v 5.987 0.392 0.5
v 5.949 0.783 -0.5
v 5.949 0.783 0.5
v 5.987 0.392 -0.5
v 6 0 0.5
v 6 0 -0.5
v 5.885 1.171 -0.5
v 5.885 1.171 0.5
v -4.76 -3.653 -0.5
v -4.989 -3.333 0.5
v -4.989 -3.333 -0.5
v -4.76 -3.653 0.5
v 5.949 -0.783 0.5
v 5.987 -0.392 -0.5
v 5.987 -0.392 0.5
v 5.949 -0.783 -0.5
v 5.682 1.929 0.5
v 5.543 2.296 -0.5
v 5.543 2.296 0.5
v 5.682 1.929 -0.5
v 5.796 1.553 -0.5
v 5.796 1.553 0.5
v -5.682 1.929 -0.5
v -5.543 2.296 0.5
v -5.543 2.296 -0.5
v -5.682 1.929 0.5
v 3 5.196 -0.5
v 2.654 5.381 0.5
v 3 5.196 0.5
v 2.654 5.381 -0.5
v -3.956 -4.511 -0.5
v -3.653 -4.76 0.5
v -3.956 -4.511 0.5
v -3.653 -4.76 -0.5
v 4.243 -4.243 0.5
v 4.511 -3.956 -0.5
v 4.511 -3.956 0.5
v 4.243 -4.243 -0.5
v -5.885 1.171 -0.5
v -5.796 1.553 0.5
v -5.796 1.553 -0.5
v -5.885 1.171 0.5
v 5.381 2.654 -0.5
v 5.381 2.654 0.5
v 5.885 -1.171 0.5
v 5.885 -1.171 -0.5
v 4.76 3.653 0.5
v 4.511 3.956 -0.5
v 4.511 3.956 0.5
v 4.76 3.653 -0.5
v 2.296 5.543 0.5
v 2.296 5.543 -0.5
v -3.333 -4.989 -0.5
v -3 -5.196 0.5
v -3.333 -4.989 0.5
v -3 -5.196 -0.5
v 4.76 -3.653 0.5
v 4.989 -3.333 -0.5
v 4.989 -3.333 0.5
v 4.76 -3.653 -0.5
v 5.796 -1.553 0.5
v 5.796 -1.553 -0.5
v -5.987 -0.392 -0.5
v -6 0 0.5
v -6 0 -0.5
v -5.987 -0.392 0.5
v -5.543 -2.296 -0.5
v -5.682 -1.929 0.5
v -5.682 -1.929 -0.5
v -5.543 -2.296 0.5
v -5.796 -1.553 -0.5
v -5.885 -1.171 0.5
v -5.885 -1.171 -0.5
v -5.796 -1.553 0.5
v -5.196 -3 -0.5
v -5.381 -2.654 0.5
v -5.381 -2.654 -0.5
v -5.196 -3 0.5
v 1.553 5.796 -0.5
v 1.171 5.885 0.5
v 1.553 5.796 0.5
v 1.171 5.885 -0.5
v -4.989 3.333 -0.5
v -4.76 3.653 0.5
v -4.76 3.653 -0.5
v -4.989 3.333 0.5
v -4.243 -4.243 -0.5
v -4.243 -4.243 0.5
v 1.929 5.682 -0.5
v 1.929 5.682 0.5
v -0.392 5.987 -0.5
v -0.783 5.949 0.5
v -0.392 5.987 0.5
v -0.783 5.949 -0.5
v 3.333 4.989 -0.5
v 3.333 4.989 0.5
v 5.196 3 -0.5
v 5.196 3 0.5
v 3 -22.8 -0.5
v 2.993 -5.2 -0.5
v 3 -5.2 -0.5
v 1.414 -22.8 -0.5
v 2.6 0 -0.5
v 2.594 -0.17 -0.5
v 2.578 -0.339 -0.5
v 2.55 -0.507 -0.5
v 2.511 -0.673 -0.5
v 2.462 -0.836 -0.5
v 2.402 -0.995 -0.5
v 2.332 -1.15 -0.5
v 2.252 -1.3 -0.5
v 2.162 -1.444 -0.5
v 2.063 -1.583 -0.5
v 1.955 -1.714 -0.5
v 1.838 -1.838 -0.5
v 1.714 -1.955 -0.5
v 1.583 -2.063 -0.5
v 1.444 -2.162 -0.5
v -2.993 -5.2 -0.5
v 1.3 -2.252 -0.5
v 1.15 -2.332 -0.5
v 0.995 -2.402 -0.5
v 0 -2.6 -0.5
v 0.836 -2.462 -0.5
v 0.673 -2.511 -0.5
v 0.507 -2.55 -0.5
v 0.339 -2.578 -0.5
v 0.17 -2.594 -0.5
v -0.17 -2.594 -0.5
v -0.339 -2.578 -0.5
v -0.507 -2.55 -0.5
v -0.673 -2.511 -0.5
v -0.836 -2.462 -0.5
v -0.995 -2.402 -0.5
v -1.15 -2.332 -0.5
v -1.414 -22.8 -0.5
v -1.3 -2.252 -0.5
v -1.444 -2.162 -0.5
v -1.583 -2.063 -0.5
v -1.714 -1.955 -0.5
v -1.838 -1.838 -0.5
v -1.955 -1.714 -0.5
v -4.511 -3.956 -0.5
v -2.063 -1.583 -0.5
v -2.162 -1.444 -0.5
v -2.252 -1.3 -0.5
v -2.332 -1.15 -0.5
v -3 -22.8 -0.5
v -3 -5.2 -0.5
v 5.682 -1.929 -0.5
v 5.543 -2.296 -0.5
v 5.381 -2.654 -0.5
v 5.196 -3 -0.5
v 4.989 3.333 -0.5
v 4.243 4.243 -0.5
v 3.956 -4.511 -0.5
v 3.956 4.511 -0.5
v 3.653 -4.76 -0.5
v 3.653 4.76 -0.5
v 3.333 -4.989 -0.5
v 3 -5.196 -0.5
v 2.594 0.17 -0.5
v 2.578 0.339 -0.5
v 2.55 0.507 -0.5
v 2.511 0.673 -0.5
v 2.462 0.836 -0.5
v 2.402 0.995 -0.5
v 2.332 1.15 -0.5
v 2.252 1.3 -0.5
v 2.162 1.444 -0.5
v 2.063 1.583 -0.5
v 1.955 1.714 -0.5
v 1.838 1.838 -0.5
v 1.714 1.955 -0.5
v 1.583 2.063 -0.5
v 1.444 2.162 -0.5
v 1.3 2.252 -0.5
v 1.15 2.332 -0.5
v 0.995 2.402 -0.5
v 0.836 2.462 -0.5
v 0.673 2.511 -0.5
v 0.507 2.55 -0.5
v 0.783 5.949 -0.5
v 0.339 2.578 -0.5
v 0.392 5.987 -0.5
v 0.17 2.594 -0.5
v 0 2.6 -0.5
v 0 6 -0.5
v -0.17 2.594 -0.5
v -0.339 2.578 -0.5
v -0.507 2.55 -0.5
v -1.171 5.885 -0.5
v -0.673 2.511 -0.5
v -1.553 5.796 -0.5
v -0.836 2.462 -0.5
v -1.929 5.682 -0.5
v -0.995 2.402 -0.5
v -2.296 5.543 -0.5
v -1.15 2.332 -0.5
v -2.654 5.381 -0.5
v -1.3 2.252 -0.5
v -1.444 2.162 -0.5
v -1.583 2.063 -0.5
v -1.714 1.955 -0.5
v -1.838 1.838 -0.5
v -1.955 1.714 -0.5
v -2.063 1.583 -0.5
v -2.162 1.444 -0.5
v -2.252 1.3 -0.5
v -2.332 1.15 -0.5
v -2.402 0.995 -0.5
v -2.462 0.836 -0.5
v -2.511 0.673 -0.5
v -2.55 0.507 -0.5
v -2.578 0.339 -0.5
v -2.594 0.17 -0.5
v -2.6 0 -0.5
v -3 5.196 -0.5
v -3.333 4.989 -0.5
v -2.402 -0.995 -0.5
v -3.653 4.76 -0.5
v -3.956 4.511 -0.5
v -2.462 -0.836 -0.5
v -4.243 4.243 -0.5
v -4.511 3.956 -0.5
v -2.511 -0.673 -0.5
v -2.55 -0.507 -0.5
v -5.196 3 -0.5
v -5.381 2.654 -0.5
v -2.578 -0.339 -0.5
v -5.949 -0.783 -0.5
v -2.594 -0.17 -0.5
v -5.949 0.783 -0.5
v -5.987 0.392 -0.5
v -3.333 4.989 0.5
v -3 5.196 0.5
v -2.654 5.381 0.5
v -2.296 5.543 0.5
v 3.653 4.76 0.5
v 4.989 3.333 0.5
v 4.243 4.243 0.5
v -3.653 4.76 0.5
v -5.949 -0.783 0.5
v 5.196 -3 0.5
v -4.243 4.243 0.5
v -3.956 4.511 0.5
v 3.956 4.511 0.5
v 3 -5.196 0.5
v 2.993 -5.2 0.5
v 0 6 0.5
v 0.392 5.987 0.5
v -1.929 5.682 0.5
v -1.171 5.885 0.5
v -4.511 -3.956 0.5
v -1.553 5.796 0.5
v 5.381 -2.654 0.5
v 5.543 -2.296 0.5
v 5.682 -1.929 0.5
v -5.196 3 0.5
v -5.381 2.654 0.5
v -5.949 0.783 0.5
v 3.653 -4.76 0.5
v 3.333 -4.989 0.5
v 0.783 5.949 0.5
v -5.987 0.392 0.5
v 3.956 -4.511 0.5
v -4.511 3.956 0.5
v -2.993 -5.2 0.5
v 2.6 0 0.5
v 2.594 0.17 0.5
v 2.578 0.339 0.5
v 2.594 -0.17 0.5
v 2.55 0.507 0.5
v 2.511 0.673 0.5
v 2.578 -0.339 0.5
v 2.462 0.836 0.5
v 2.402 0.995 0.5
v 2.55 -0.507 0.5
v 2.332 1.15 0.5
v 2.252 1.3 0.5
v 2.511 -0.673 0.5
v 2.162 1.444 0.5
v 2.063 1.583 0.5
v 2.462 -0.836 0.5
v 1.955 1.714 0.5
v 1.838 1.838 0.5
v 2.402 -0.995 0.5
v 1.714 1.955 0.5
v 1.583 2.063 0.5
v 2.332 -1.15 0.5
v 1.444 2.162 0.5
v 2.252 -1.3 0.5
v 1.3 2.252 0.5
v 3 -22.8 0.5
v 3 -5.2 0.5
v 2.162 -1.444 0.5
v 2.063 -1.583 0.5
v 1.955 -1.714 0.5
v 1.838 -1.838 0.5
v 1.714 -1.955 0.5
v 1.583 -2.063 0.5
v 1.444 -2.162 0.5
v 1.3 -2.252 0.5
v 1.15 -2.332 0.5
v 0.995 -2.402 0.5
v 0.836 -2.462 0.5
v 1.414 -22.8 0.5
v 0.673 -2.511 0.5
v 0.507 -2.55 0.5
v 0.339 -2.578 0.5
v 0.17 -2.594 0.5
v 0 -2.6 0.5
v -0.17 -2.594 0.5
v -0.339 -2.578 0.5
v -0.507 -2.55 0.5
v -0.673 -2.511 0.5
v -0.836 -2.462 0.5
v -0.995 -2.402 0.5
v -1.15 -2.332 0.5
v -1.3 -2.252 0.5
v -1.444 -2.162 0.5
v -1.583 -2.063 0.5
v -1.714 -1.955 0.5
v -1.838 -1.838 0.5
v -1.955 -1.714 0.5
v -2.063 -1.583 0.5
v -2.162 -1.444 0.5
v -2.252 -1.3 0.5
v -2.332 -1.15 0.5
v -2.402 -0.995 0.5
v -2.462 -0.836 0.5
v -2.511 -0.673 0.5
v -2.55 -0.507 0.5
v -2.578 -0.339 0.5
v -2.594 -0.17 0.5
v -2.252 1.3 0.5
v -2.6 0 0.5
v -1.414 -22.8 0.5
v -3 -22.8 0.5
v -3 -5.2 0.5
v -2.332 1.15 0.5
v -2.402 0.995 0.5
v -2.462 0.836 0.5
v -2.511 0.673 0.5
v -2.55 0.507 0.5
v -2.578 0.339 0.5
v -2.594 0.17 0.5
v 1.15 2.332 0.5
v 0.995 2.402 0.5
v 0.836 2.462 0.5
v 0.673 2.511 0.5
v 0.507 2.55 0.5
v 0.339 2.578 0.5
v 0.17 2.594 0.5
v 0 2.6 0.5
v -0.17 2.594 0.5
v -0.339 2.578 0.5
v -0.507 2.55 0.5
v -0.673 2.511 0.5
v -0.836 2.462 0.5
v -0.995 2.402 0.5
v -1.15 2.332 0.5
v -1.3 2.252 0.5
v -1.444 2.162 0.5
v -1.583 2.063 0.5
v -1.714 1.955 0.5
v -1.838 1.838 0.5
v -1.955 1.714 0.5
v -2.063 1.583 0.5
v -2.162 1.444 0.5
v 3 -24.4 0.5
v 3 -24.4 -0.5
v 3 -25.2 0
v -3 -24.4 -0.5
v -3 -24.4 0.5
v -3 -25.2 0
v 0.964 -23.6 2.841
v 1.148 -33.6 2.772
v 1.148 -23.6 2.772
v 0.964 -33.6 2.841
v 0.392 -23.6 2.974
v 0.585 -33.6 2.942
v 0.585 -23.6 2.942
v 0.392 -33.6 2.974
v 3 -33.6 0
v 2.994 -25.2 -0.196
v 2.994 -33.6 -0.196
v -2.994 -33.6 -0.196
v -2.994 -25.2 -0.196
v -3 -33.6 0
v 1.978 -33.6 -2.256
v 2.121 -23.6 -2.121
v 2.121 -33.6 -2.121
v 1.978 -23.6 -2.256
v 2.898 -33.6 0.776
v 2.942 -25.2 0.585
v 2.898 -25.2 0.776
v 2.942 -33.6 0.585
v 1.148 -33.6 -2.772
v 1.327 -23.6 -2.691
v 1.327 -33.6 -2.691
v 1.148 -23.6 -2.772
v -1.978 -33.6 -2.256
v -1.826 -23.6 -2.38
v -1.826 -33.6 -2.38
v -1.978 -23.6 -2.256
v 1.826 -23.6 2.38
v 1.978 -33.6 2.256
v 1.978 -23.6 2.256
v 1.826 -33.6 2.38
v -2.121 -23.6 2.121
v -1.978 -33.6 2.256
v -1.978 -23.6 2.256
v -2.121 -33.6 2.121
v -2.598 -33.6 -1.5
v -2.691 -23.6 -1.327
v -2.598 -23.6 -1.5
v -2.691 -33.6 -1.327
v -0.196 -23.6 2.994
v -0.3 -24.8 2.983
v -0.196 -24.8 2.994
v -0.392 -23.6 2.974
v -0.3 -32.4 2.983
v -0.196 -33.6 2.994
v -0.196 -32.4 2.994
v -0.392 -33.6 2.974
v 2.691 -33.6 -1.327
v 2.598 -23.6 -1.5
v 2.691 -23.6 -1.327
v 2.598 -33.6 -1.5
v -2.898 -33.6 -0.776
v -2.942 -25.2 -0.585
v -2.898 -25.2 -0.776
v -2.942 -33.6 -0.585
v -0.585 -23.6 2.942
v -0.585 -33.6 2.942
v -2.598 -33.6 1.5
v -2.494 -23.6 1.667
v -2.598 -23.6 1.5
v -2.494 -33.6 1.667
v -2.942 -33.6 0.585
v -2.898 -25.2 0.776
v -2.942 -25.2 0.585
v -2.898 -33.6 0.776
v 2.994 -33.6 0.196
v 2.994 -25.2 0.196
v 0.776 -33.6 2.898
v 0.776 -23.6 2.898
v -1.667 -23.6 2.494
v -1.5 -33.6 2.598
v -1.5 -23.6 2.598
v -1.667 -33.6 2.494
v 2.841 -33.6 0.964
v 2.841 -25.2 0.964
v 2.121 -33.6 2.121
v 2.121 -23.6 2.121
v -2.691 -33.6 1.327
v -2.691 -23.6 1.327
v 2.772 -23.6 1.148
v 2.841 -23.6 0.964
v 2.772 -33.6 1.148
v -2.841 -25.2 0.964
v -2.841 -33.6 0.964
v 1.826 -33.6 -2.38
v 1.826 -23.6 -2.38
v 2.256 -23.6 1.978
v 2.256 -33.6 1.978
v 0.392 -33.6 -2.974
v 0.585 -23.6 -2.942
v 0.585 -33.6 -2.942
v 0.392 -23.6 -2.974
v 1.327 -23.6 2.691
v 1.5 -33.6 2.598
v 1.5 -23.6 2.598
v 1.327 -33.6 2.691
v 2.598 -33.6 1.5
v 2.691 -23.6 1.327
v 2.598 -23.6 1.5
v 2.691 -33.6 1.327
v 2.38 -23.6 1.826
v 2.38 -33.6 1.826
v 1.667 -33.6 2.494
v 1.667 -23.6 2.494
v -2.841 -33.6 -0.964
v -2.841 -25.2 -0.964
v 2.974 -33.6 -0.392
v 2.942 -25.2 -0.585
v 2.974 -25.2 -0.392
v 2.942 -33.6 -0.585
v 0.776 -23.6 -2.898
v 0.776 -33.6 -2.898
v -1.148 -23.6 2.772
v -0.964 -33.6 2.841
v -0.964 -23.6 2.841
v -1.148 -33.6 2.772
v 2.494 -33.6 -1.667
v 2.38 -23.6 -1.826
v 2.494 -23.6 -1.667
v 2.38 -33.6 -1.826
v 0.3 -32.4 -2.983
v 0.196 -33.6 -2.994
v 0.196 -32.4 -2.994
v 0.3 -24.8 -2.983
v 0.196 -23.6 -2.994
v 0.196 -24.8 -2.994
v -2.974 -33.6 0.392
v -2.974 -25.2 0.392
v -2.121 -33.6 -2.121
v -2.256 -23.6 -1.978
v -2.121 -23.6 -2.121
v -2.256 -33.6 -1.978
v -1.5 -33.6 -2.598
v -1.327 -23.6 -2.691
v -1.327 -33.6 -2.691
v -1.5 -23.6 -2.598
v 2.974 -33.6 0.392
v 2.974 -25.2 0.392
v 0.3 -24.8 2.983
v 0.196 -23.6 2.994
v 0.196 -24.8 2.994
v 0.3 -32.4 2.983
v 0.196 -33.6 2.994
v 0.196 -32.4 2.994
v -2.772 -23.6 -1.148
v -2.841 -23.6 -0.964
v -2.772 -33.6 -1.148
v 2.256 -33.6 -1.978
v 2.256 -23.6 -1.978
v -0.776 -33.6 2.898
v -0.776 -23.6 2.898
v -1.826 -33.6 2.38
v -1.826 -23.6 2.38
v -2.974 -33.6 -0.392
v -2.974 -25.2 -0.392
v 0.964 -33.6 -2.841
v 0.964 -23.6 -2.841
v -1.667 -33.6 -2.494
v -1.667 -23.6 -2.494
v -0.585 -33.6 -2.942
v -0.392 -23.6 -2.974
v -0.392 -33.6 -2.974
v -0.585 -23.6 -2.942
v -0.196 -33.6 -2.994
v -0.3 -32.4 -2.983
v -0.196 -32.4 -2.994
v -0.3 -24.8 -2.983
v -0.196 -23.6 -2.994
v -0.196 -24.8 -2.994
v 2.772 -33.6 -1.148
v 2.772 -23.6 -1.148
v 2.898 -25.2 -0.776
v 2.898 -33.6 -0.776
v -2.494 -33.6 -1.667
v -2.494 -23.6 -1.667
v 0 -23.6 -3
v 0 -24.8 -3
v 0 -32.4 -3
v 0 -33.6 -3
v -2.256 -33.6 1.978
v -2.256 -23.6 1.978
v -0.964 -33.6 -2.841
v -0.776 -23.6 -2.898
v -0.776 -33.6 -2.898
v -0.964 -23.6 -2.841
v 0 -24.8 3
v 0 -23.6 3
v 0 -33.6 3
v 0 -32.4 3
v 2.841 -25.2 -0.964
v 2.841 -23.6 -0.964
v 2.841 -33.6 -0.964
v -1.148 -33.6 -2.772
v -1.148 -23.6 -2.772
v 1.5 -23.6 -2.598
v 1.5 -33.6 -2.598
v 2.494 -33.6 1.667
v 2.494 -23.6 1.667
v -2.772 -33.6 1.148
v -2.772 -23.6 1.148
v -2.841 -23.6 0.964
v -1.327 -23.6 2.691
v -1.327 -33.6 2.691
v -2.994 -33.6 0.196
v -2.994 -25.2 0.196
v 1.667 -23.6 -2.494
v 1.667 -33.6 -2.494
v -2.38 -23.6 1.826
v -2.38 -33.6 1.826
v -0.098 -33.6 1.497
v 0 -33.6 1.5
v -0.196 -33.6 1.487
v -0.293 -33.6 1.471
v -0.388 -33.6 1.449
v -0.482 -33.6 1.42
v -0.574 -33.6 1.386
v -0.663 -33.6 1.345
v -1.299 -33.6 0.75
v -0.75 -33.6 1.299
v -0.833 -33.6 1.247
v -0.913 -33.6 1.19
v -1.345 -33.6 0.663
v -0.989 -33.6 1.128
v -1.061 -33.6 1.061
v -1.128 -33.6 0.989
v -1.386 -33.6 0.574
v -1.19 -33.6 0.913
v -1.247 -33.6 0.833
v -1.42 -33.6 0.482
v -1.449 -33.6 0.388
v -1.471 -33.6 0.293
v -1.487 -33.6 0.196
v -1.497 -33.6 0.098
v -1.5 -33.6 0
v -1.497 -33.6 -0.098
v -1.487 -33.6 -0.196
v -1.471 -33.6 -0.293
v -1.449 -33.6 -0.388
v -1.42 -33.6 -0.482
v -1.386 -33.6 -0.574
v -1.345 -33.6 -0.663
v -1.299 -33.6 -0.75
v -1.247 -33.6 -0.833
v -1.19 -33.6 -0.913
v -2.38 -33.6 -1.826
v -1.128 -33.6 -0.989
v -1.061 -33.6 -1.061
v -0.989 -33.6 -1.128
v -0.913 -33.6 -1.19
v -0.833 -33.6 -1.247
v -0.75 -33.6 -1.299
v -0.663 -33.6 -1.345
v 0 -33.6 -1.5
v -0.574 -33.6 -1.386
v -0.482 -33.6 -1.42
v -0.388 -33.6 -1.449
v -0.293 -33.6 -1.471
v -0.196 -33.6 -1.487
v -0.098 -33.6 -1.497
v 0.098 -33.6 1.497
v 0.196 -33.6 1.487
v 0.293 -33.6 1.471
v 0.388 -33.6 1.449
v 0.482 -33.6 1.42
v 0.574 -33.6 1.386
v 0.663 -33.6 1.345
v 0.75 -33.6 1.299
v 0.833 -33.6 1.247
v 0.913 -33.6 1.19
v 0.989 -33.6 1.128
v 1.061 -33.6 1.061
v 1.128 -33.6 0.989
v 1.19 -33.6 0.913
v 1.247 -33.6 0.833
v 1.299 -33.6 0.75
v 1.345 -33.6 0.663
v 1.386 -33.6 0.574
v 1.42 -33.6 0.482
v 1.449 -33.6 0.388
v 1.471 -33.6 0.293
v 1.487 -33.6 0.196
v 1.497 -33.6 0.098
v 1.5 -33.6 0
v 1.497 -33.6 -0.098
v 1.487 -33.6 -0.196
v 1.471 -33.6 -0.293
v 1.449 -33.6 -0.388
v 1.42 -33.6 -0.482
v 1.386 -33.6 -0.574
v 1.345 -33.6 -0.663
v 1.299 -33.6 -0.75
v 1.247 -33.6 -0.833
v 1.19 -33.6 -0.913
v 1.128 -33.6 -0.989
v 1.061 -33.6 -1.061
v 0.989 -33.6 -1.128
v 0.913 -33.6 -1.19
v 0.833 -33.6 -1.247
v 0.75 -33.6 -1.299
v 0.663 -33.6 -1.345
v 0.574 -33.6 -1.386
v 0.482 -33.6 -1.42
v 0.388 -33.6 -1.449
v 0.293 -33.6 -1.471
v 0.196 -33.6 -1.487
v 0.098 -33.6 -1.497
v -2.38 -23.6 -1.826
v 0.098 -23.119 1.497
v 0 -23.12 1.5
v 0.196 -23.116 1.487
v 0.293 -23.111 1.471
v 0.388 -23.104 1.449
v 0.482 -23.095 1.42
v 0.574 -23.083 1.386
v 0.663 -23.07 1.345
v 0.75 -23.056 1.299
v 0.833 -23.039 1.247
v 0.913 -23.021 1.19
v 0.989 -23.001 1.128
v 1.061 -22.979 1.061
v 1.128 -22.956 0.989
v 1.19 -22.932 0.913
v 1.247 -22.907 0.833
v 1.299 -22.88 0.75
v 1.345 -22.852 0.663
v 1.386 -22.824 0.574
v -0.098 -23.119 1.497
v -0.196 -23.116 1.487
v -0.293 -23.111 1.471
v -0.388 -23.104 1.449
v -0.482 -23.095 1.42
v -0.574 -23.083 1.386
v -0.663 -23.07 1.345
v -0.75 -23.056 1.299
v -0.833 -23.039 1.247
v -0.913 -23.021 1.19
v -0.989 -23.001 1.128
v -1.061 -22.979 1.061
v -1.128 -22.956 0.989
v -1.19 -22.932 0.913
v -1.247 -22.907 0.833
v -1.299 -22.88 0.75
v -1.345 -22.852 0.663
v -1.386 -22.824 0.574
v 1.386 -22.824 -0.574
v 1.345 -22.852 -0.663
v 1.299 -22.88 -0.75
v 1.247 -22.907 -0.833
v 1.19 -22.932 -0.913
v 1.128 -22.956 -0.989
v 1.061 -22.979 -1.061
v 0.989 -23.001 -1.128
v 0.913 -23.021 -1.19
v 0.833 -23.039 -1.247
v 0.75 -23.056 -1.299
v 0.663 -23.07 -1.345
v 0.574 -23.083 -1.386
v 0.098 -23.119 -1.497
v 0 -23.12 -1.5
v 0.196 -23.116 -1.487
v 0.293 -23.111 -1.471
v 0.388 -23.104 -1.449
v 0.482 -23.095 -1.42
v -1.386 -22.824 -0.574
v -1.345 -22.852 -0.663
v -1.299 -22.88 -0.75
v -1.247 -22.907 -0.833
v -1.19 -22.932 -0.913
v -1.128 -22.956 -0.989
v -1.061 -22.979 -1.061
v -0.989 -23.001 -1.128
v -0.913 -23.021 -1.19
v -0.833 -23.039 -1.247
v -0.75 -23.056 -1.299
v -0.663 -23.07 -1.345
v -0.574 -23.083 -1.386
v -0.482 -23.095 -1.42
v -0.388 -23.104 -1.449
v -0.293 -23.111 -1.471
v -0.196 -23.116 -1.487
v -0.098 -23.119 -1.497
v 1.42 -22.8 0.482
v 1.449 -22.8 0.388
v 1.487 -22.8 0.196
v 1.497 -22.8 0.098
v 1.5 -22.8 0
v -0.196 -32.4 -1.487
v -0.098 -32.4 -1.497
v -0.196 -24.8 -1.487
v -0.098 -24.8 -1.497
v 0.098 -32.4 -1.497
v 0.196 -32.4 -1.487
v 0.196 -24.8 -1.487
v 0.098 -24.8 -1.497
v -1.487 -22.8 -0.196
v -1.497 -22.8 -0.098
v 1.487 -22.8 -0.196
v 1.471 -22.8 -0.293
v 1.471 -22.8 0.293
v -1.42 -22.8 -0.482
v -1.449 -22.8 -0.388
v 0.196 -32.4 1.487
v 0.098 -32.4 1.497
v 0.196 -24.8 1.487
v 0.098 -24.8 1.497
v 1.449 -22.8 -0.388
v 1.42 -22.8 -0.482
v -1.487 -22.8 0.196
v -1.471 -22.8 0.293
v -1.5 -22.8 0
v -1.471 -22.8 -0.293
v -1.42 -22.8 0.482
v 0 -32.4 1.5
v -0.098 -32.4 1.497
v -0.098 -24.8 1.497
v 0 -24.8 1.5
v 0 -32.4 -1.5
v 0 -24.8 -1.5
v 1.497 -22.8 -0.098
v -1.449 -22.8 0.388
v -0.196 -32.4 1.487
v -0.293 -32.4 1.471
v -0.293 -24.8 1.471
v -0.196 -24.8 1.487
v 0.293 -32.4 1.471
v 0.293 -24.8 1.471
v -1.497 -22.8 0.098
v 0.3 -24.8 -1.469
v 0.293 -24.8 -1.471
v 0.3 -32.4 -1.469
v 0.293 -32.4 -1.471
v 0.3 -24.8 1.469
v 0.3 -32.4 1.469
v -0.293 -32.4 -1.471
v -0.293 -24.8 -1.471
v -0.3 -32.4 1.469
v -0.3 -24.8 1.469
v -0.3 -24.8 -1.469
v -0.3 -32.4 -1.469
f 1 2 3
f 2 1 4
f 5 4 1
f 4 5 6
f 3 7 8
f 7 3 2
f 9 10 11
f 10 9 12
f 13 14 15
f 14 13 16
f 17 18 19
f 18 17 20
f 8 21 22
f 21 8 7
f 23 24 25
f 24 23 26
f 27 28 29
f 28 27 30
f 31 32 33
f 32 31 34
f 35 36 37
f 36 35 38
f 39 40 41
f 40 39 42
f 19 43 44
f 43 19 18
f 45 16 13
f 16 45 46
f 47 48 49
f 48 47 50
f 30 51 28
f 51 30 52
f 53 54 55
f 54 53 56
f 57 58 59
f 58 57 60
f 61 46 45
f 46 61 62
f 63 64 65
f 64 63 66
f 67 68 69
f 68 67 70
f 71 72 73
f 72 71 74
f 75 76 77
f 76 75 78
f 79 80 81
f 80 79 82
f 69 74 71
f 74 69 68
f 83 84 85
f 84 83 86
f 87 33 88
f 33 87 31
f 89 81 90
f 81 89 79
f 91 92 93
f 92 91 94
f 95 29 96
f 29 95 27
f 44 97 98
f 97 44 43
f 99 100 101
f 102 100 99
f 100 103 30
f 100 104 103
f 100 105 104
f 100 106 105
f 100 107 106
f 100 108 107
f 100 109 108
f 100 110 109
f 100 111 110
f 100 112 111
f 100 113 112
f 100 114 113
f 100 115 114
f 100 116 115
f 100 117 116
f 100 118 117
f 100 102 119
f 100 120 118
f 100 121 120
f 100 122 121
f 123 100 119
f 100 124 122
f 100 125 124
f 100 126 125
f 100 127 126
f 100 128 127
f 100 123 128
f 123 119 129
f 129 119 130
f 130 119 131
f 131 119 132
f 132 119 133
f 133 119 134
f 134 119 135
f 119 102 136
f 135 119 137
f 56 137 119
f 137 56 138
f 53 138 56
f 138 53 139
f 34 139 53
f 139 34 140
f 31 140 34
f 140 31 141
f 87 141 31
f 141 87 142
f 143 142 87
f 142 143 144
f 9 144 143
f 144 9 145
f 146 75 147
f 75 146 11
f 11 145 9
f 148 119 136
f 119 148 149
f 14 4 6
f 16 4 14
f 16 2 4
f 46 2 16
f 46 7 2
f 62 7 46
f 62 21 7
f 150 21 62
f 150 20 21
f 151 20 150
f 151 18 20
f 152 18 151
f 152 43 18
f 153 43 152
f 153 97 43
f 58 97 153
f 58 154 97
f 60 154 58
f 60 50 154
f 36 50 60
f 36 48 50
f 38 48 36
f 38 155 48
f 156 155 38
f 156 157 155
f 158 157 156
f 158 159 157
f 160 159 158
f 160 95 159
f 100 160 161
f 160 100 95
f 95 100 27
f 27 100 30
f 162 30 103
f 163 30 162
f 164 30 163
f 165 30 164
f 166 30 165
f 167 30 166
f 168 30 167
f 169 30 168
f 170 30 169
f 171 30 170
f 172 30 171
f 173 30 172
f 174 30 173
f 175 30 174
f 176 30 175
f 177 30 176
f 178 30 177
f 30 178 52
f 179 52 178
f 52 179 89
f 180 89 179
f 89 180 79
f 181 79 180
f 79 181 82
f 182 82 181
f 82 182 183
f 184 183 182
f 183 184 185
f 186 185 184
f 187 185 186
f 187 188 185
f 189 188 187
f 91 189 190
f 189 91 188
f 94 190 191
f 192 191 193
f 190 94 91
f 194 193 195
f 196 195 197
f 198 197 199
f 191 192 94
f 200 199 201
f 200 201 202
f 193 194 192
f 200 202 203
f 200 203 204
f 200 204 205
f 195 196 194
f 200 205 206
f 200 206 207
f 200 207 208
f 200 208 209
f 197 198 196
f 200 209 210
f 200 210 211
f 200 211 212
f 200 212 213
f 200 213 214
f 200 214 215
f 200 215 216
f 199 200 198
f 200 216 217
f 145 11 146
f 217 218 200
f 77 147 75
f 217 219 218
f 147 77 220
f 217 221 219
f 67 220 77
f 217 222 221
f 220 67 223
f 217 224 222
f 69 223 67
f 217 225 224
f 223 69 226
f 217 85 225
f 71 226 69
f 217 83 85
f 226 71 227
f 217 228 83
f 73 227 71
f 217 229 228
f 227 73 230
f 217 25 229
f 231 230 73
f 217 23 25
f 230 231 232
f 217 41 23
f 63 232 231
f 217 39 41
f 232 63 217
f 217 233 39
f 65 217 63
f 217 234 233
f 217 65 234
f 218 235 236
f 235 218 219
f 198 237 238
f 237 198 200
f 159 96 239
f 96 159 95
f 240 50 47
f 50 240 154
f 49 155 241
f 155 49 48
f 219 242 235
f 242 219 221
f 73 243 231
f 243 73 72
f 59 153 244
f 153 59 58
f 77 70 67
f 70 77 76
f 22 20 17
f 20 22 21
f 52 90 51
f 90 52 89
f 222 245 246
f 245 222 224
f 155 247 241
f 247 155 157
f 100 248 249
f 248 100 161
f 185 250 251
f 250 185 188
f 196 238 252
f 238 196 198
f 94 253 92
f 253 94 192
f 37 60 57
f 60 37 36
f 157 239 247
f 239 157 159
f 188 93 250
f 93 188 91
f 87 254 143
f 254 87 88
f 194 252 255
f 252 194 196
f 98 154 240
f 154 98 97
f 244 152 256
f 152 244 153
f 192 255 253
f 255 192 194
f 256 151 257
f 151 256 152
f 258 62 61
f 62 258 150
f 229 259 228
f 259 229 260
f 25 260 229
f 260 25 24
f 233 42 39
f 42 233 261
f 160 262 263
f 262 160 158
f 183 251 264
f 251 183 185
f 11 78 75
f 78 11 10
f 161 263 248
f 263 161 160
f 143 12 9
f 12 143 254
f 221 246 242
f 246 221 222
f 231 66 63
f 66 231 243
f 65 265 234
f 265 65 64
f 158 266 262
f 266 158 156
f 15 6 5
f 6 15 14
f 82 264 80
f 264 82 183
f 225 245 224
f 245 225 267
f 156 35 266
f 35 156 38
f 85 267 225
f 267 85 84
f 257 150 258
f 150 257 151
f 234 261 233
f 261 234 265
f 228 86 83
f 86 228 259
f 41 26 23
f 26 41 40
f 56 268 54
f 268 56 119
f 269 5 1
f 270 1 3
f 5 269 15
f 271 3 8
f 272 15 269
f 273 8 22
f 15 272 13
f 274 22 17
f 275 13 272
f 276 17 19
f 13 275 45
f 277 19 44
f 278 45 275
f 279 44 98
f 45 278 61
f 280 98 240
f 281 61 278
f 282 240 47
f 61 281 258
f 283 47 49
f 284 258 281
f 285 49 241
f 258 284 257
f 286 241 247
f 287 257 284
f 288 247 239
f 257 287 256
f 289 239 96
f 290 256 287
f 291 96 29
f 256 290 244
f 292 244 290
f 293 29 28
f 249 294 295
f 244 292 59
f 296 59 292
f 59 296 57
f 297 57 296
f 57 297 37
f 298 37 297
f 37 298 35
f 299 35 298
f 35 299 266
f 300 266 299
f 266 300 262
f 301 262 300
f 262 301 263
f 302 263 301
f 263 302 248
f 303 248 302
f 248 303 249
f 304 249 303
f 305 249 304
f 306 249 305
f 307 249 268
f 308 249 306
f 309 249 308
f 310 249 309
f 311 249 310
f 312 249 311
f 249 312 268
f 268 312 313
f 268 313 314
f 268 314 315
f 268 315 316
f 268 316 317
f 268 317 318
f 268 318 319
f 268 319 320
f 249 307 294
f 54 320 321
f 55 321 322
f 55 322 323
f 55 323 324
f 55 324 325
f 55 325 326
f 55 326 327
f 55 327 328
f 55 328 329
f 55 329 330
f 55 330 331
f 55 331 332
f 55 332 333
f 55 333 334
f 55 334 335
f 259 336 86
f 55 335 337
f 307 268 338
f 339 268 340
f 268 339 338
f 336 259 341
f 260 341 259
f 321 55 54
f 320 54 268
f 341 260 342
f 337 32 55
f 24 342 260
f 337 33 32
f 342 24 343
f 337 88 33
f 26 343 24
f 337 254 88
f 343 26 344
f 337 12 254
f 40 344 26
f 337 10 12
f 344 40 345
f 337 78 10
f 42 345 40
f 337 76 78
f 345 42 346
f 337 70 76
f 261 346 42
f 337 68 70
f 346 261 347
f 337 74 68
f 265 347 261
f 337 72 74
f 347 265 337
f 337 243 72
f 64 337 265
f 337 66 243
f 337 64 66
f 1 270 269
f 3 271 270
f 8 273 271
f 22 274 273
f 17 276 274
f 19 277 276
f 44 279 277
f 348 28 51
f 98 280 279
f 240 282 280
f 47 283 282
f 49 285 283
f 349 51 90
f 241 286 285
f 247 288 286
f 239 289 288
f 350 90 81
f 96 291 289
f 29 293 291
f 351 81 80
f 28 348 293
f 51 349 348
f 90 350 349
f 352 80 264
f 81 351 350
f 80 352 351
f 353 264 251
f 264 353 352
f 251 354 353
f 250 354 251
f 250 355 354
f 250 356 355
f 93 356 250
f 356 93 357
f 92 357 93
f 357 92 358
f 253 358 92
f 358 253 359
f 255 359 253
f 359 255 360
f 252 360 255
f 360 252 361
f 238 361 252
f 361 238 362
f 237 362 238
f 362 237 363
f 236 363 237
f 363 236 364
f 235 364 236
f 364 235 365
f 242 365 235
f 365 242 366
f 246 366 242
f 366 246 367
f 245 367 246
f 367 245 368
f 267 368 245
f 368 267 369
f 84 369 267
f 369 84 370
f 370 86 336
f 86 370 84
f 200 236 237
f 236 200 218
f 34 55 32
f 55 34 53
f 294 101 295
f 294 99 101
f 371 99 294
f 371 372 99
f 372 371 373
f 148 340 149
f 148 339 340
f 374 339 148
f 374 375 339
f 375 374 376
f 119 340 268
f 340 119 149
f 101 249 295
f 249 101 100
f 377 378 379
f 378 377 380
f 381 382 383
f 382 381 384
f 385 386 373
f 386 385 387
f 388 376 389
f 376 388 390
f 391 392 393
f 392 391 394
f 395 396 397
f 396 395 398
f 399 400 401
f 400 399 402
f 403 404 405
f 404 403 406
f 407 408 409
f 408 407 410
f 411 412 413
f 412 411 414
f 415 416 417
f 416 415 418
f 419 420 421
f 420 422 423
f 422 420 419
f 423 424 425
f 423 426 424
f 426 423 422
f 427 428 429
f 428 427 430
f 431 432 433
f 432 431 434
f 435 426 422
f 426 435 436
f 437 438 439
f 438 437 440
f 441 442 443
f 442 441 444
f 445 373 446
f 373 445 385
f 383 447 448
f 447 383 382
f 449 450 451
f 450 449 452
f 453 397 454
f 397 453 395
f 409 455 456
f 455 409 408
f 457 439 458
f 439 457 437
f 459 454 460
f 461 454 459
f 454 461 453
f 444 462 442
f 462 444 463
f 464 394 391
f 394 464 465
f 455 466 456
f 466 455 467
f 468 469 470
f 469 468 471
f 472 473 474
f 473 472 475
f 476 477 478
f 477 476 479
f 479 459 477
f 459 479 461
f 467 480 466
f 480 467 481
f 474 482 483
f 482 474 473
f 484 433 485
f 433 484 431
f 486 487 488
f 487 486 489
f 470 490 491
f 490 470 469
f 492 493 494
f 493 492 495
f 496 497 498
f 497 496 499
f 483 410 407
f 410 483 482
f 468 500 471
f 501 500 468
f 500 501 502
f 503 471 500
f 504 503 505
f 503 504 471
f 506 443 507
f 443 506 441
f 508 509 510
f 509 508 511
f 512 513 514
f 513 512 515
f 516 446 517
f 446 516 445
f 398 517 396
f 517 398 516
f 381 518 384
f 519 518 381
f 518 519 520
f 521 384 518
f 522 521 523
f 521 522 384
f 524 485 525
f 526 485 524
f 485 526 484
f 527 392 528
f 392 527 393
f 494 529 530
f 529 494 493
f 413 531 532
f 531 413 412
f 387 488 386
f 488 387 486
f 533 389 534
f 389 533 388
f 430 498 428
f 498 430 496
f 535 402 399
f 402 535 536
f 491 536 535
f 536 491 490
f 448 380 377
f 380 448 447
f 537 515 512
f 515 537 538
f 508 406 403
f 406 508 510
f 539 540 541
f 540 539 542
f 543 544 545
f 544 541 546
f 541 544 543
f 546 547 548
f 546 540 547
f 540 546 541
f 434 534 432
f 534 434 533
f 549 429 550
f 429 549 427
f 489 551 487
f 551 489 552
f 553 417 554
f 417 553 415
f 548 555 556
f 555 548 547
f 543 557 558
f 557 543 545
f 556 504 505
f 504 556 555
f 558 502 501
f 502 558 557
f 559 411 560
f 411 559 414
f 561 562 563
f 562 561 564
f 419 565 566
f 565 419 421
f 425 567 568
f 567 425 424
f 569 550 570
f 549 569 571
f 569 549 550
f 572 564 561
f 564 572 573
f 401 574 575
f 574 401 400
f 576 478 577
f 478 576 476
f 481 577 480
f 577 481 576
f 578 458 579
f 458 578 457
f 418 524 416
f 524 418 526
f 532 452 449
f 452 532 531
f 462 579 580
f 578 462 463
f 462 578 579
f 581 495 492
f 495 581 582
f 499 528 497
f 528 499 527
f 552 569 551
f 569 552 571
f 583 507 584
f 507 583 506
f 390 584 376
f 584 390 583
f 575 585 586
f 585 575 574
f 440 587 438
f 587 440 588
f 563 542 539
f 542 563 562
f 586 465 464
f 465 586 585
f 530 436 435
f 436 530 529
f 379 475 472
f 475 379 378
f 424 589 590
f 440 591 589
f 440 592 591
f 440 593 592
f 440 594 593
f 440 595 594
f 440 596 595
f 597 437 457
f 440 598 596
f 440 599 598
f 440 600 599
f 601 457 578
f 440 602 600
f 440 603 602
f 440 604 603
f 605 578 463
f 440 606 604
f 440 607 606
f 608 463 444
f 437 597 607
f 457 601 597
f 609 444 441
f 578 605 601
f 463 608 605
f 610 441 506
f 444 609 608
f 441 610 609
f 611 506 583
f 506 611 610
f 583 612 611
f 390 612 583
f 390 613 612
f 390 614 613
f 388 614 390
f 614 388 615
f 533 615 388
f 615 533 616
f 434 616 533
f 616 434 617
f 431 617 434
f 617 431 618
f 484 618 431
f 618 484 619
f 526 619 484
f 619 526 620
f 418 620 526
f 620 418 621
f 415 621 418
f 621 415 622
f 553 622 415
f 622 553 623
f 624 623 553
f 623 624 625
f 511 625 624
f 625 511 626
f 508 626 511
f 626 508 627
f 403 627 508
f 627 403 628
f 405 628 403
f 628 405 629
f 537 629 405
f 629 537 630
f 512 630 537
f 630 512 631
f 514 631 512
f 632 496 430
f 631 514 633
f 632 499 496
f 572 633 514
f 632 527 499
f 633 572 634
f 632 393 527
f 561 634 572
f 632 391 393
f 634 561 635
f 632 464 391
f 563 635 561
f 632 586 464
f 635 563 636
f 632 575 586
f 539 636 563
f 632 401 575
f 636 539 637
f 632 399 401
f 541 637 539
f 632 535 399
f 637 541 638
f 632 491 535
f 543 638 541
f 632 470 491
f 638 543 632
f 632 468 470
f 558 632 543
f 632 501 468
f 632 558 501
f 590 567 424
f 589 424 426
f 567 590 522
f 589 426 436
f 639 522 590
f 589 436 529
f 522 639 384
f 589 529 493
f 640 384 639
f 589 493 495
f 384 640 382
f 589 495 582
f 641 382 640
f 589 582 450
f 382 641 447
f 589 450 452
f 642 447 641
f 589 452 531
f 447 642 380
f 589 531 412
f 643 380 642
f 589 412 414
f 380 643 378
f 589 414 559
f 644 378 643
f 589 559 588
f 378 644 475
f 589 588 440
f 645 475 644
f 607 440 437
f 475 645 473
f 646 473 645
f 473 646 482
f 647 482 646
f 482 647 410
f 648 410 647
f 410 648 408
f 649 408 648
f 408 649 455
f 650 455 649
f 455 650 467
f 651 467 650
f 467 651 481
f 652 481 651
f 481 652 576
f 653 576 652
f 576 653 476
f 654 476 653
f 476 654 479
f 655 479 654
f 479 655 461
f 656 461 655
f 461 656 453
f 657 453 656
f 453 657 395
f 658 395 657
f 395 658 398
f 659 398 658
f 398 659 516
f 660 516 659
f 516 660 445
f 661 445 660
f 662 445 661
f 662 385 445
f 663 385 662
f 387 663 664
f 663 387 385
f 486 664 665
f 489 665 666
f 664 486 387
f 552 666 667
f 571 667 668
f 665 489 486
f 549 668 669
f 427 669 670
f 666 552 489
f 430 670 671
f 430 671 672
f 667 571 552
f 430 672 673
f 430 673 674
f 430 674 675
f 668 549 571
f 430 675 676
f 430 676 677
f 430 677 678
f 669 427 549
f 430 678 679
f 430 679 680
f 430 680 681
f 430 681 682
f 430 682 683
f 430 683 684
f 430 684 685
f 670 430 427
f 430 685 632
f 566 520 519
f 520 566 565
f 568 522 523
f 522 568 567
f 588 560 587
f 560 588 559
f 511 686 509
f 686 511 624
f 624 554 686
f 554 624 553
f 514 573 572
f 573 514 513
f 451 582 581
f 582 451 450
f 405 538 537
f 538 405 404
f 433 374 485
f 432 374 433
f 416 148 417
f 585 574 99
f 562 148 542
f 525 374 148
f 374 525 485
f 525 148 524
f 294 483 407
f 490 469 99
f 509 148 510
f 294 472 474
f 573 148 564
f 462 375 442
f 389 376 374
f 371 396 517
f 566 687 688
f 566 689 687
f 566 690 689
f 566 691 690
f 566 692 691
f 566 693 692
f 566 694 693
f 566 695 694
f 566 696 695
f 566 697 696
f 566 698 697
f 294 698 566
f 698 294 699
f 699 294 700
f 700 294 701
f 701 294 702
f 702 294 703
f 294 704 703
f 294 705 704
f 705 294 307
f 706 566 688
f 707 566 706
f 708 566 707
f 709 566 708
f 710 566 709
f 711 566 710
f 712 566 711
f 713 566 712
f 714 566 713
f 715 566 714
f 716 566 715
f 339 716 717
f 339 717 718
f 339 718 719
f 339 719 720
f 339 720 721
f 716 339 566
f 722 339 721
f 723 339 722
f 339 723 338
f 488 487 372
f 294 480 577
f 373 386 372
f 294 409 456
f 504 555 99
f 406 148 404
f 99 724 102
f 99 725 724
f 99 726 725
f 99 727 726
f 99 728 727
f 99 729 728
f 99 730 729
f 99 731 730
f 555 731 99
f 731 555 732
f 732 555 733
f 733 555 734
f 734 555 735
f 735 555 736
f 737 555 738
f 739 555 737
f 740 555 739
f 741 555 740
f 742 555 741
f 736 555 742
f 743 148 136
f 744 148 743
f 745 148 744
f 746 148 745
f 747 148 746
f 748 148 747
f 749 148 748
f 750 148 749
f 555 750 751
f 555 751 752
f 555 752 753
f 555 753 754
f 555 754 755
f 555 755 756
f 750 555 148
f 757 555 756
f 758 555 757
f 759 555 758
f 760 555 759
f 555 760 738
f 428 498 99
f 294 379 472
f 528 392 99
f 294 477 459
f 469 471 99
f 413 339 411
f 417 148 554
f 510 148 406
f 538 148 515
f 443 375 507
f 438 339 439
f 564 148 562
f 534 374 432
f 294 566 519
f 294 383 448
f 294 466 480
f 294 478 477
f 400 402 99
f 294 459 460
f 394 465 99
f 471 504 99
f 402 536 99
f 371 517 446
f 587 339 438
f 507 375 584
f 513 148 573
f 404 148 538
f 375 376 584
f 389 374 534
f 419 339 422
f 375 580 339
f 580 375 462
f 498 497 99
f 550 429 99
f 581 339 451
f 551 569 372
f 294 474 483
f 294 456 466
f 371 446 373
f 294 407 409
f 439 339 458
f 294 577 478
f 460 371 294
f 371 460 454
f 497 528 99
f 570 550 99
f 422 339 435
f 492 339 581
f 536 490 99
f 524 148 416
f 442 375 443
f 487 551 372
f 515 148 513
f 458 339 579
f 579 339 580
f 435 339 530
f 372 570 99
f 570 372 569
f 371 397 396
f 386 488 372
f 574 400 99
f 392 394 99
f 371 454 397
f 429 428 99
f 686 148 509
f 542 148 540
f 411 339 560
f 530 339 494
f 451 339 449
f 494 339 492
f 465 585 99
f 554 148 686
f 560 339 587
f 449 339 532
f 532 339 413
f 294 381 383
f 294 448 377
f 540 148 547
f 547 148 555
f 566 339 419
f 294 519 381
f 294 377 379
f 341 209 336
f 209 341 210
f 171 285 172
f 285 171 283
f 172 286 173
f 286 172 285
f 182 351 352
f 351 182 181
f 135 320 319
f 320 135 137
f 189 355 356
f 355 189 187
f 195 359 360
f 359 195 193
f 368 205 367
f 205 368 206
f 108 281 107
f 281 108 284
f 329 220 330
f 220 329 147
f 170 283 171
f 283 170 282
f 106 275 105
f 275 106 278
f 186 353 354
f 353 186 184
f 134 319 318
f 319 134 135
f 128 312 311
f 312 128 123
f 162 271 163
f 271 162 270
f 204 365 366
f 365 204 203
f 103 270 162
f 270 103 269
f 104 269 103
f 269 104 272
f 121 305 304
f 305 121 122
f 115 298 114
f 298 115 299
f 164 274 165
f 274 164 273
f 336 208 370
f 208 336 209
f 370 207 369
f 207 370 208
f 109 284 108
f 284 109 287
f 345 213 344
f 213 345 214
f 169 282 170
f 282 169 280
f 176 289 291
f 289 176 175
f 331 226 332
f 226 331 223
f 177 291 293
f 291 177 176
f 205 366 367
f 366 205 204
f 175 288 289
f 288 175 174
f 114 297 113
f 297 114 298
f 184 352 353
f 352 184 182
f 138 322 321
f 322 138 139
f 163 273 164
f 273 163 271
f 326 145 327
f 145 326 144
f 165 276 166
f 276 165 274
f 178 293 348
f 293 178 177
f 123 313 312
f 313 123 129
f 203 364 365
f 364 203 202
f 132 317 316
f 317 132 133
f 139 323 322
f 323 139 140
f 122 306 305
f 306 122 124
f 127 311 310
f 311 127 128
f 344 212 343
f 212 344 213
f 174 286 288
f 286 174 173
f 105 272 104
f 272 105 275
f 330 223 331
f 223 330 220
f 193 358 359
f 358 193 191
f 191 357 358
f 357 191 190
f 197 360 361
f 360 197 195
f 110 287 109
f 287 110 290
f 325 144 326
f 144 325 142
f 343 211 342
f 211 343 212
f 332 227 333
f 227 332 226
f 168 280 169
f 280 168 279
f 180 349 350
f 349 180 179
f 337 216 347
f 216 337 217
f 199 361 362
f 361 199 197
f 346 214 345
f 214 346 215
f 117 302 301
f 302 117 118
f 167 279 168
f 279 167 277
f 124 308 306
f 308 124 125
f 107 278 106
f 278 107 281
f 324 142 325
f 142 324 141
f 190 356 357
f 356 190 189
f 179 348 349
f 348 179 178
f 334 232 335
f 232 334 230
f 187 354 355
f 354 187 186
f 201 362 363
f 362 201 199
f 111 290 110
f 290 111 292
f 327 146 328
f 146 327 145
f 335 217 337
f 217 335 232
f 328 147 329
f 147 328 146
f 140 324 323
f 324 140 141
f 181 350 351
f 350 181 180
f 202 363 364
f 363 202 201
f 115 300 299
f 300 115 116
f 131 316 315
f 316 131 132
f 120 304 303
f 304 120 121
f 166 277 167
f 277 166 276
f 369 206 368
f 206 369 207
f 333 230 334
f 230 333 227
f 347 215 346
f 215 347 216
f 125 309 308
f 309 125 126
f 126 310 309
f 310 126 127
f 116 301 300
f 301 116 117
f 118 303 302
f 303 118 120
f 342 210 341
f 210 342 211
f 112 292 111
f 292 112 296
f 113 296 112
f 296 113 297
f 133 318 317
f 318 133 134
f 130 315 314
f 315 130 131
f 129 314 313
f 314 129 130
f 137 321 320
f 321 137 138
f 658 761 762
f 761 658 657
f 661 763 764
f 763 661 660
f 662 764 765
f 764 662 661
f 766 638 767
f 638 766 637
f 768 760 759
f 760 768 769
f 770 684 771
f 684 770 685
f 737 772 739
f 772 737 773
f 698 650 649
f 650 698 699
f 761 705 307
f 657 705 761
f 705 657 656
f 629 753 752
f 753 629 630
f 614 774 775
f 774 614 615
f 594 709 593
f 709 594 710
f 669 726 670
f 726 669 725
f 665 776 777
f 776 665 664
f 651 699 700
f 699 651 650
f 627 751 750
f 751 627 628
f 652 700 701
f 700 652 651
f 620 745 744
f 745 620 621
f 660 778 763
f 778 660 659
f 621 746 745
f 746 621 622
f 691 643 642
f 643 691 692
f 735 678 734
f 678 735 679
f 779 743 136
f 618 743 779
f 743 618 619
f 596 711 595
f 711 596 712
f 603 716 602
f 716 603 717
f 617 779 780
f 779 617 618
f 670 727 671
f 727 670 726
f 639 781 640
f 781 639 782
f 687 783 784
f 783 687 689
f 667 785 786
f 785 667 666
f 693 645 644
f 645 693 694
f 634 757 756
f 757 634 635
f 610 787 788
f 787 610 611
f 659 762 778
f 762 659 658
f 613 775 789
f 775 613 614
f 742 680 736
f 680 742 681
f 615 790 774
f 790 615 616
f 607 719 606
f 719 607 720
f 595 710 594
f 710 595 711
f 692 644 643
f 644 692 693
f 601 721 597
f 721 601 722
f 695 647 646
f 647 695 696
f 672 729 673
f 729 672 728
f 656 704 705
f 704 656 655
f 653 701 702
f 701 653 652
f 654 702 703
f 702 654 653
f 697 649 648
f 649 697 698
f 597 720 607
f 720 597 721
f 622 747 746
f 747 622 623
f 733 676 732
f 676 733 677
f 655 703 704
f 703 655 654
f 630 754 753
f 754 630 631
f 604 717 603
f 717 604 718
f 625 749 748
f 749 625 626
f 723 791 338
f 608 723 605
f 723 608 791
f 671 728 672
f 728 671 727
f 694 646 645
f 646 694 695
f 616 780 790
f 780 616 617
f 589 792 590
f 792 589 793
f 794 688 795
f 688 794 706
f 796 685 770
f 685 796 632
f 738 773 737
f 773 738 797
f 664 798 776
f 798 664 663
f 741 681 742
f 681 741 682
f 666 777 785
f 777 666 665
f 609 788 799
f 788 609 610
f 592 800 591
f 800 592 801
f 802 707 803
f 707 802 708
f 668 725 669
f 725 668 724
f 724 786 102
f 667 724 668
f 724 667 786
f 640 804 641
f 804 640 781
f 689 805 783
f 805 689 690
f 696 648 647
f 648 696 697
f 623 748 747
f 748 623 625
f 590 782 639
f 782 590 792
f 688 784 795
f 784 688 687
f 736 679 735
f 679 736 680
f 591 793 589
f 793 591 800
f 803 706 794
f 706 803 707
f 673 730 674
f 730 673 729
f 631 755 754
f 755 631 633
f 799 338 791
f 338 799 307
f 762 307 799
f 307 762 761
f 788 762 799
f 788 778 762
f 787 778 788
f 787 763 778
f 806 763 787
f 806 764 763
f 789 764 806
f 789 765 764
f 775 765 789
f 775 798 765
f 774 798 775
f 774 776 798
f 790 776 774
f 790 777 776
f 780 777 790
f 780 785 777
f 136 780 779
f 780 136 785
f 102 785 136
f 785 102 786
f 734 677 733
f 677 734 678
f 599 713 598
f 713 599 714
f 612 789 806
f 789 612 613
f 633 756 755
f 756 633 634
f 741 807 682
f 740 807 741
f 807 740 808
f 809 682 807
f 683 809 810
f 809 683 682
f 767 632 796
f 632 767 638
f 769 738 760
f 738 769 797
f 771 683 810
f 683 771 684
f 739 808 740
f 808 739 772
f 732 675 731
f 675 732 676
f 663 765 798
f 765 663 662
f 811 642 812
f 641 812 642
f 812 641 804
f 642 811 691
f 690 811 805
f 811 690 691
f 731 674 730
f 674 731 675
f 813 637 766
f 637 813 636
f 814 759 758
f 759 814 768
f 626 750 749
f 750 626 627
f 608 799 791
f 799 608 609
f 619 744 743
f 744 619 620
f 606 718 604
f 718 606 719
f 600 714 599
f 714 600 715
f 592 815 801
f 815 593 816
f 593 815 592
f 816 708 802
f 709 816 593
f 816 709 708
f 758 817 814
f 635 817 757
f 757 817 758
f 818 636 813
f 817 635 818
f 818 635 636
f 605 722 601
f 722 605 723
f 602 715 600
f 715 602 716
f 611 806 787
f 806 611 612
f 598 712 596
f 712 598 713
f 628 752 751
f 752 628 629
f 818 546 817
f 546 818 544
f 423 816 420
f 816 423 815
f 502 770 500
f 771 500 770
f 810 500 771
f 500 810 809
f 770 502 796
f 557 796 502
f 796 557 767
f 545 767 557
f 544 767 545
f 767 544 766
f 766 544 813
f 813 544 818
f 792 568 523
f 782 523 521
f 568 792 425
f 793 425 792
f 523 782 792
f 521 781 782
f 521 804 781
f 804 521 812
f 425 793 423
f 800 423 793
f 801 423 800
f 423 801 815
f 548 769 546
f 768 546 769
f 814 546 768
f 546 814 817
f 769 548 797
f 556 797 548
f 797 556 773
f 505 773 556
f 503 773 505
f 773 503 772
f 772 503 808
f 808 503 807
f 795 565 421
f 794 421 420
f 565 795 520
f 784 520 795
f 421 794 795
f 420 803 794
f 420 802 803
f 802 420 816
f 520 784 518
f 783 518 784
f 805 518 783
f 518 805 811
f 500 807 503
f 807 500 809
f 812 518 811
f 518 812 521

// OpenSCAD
$fn = 96;

// Parameters
outer_diameter = 12; //[6:24:0.5]
inner_hole_diameter = 5; //[2.5:10:0.5]
thickness = 1; //[0.5:2:0.1]
overall_length = 25; //[12.5:50:0.5]
width = 6; //[3:12:0.5]
crimp_barrel_length = 10; //[5:20:0.5]
transition_length = 1; //[0.5:3:0.1]
hole_clearance = 0.2; //[0:0.6:0.05]
overlap = 0.8; //[0.5:2:0.1]
barrel_wall = 0.6; //[0.3:1.2:0.05]
wire_entry_diameter = 3; //[1.5:6:0.5]
slot_width = 0.6; //[0.3:1.5:0.1]

// Derived / safety
ring_r = outer_diameter/2;
hole_r = (inner_hole_diameter + hole_clearance)/2;
tongue_len = max(0.1, overall_length - outer_diameter/2);
barrel_outer_r = width/2;
barrel_inner_r = max(0.1, min(wire_entry_diameter/2, barrel_outer_r - barrel_wall));
slot_w = min(slot_width, 2*barrel_inner_r - 0.05);

// Placement along Y (ring at y=0, tongue extends to -Y, barrel continues further -Y)
y_ring_center = 0;
y_ring_bottom = y_ring_center - ring_r;

y_transition_center = y_ring_bottom - transition_length/2 + overlap;
y_transition_bottom = y_transition_center - transition_length/2;

y_tongue_center = y_transition_bottom - tongue_len/2 + overlap;
y_tongue_bottom = y_tongue_center - tongue_len/2;

y_barrel_center = y_tongue_bottom - crimp_barrel_length/2 + overlap;

// Ring terminal: one connected solid with clear ring hole and hollow barrel opening
module ring_terminal_connected() {
  color("Silver")
  difference() {
    // SOLID union (outer shape)
    union() {
      // Ring (disk)
      translate([0, y_ring_center, 0])
        cylinder(r=ring_r, h=thickness, center=true);

      // Transition block (small neck)
      translate([0, y_transition_center, 0])
        cube([width, transition_length, thickness], center=true);

      // Tongue (flat strap)
      translate([0, y_tongue_center, 0])
        cube([width, tongue_len, thickness], center=true);

      // Barrel outer (tube) aligned along Y
      translate([0, y_barrel_center, 0])
        rotate([90, 0, 0])
          cylinder(r=barrel_outer_r, h=crimp_barrel_length, center=true);

      // Small fillet-like bridge between tongue and barrel for robust connectivity
      hull() {
        translate([0, y_tongue_bottom + overlap, 0])
          cube([width, overlap*2, thickness], center=true);
        translate([0, y_barrel_center + crimp_barrel_length/2 - overlap, 0])
          rotate([90, 0, 0])
            cylinder(r=barrel_outer_r, h=overlap*2, center=true);
      }
    }

    // SUBTRACT: ring hole
    translate([0, y_ring_center, 0])
      cylinder(r=hole_r, h=thickness + 2*overlap, center=true);

    // SUBTRACT: barrel inner bore (wire entry)
    translate([0, y_barrel_center, 0])
      rotate([90, 0, 0])
        cylinder(r=barrel_inner_r, h=crimp_barrel_length + 2*overlap, center=true);

    // SUBTRACT: crimp slot (longitudinal opening) through barrel wall
    translate([0, y_barrel_center, 0])
      rotate([90, 0, 0])
        cube([slot_w, crimp_barrel_length + 2*overlap, 2*barrel_outer_r + 2*overlap], center=true);
  }
}

ring_terminal_connected();
